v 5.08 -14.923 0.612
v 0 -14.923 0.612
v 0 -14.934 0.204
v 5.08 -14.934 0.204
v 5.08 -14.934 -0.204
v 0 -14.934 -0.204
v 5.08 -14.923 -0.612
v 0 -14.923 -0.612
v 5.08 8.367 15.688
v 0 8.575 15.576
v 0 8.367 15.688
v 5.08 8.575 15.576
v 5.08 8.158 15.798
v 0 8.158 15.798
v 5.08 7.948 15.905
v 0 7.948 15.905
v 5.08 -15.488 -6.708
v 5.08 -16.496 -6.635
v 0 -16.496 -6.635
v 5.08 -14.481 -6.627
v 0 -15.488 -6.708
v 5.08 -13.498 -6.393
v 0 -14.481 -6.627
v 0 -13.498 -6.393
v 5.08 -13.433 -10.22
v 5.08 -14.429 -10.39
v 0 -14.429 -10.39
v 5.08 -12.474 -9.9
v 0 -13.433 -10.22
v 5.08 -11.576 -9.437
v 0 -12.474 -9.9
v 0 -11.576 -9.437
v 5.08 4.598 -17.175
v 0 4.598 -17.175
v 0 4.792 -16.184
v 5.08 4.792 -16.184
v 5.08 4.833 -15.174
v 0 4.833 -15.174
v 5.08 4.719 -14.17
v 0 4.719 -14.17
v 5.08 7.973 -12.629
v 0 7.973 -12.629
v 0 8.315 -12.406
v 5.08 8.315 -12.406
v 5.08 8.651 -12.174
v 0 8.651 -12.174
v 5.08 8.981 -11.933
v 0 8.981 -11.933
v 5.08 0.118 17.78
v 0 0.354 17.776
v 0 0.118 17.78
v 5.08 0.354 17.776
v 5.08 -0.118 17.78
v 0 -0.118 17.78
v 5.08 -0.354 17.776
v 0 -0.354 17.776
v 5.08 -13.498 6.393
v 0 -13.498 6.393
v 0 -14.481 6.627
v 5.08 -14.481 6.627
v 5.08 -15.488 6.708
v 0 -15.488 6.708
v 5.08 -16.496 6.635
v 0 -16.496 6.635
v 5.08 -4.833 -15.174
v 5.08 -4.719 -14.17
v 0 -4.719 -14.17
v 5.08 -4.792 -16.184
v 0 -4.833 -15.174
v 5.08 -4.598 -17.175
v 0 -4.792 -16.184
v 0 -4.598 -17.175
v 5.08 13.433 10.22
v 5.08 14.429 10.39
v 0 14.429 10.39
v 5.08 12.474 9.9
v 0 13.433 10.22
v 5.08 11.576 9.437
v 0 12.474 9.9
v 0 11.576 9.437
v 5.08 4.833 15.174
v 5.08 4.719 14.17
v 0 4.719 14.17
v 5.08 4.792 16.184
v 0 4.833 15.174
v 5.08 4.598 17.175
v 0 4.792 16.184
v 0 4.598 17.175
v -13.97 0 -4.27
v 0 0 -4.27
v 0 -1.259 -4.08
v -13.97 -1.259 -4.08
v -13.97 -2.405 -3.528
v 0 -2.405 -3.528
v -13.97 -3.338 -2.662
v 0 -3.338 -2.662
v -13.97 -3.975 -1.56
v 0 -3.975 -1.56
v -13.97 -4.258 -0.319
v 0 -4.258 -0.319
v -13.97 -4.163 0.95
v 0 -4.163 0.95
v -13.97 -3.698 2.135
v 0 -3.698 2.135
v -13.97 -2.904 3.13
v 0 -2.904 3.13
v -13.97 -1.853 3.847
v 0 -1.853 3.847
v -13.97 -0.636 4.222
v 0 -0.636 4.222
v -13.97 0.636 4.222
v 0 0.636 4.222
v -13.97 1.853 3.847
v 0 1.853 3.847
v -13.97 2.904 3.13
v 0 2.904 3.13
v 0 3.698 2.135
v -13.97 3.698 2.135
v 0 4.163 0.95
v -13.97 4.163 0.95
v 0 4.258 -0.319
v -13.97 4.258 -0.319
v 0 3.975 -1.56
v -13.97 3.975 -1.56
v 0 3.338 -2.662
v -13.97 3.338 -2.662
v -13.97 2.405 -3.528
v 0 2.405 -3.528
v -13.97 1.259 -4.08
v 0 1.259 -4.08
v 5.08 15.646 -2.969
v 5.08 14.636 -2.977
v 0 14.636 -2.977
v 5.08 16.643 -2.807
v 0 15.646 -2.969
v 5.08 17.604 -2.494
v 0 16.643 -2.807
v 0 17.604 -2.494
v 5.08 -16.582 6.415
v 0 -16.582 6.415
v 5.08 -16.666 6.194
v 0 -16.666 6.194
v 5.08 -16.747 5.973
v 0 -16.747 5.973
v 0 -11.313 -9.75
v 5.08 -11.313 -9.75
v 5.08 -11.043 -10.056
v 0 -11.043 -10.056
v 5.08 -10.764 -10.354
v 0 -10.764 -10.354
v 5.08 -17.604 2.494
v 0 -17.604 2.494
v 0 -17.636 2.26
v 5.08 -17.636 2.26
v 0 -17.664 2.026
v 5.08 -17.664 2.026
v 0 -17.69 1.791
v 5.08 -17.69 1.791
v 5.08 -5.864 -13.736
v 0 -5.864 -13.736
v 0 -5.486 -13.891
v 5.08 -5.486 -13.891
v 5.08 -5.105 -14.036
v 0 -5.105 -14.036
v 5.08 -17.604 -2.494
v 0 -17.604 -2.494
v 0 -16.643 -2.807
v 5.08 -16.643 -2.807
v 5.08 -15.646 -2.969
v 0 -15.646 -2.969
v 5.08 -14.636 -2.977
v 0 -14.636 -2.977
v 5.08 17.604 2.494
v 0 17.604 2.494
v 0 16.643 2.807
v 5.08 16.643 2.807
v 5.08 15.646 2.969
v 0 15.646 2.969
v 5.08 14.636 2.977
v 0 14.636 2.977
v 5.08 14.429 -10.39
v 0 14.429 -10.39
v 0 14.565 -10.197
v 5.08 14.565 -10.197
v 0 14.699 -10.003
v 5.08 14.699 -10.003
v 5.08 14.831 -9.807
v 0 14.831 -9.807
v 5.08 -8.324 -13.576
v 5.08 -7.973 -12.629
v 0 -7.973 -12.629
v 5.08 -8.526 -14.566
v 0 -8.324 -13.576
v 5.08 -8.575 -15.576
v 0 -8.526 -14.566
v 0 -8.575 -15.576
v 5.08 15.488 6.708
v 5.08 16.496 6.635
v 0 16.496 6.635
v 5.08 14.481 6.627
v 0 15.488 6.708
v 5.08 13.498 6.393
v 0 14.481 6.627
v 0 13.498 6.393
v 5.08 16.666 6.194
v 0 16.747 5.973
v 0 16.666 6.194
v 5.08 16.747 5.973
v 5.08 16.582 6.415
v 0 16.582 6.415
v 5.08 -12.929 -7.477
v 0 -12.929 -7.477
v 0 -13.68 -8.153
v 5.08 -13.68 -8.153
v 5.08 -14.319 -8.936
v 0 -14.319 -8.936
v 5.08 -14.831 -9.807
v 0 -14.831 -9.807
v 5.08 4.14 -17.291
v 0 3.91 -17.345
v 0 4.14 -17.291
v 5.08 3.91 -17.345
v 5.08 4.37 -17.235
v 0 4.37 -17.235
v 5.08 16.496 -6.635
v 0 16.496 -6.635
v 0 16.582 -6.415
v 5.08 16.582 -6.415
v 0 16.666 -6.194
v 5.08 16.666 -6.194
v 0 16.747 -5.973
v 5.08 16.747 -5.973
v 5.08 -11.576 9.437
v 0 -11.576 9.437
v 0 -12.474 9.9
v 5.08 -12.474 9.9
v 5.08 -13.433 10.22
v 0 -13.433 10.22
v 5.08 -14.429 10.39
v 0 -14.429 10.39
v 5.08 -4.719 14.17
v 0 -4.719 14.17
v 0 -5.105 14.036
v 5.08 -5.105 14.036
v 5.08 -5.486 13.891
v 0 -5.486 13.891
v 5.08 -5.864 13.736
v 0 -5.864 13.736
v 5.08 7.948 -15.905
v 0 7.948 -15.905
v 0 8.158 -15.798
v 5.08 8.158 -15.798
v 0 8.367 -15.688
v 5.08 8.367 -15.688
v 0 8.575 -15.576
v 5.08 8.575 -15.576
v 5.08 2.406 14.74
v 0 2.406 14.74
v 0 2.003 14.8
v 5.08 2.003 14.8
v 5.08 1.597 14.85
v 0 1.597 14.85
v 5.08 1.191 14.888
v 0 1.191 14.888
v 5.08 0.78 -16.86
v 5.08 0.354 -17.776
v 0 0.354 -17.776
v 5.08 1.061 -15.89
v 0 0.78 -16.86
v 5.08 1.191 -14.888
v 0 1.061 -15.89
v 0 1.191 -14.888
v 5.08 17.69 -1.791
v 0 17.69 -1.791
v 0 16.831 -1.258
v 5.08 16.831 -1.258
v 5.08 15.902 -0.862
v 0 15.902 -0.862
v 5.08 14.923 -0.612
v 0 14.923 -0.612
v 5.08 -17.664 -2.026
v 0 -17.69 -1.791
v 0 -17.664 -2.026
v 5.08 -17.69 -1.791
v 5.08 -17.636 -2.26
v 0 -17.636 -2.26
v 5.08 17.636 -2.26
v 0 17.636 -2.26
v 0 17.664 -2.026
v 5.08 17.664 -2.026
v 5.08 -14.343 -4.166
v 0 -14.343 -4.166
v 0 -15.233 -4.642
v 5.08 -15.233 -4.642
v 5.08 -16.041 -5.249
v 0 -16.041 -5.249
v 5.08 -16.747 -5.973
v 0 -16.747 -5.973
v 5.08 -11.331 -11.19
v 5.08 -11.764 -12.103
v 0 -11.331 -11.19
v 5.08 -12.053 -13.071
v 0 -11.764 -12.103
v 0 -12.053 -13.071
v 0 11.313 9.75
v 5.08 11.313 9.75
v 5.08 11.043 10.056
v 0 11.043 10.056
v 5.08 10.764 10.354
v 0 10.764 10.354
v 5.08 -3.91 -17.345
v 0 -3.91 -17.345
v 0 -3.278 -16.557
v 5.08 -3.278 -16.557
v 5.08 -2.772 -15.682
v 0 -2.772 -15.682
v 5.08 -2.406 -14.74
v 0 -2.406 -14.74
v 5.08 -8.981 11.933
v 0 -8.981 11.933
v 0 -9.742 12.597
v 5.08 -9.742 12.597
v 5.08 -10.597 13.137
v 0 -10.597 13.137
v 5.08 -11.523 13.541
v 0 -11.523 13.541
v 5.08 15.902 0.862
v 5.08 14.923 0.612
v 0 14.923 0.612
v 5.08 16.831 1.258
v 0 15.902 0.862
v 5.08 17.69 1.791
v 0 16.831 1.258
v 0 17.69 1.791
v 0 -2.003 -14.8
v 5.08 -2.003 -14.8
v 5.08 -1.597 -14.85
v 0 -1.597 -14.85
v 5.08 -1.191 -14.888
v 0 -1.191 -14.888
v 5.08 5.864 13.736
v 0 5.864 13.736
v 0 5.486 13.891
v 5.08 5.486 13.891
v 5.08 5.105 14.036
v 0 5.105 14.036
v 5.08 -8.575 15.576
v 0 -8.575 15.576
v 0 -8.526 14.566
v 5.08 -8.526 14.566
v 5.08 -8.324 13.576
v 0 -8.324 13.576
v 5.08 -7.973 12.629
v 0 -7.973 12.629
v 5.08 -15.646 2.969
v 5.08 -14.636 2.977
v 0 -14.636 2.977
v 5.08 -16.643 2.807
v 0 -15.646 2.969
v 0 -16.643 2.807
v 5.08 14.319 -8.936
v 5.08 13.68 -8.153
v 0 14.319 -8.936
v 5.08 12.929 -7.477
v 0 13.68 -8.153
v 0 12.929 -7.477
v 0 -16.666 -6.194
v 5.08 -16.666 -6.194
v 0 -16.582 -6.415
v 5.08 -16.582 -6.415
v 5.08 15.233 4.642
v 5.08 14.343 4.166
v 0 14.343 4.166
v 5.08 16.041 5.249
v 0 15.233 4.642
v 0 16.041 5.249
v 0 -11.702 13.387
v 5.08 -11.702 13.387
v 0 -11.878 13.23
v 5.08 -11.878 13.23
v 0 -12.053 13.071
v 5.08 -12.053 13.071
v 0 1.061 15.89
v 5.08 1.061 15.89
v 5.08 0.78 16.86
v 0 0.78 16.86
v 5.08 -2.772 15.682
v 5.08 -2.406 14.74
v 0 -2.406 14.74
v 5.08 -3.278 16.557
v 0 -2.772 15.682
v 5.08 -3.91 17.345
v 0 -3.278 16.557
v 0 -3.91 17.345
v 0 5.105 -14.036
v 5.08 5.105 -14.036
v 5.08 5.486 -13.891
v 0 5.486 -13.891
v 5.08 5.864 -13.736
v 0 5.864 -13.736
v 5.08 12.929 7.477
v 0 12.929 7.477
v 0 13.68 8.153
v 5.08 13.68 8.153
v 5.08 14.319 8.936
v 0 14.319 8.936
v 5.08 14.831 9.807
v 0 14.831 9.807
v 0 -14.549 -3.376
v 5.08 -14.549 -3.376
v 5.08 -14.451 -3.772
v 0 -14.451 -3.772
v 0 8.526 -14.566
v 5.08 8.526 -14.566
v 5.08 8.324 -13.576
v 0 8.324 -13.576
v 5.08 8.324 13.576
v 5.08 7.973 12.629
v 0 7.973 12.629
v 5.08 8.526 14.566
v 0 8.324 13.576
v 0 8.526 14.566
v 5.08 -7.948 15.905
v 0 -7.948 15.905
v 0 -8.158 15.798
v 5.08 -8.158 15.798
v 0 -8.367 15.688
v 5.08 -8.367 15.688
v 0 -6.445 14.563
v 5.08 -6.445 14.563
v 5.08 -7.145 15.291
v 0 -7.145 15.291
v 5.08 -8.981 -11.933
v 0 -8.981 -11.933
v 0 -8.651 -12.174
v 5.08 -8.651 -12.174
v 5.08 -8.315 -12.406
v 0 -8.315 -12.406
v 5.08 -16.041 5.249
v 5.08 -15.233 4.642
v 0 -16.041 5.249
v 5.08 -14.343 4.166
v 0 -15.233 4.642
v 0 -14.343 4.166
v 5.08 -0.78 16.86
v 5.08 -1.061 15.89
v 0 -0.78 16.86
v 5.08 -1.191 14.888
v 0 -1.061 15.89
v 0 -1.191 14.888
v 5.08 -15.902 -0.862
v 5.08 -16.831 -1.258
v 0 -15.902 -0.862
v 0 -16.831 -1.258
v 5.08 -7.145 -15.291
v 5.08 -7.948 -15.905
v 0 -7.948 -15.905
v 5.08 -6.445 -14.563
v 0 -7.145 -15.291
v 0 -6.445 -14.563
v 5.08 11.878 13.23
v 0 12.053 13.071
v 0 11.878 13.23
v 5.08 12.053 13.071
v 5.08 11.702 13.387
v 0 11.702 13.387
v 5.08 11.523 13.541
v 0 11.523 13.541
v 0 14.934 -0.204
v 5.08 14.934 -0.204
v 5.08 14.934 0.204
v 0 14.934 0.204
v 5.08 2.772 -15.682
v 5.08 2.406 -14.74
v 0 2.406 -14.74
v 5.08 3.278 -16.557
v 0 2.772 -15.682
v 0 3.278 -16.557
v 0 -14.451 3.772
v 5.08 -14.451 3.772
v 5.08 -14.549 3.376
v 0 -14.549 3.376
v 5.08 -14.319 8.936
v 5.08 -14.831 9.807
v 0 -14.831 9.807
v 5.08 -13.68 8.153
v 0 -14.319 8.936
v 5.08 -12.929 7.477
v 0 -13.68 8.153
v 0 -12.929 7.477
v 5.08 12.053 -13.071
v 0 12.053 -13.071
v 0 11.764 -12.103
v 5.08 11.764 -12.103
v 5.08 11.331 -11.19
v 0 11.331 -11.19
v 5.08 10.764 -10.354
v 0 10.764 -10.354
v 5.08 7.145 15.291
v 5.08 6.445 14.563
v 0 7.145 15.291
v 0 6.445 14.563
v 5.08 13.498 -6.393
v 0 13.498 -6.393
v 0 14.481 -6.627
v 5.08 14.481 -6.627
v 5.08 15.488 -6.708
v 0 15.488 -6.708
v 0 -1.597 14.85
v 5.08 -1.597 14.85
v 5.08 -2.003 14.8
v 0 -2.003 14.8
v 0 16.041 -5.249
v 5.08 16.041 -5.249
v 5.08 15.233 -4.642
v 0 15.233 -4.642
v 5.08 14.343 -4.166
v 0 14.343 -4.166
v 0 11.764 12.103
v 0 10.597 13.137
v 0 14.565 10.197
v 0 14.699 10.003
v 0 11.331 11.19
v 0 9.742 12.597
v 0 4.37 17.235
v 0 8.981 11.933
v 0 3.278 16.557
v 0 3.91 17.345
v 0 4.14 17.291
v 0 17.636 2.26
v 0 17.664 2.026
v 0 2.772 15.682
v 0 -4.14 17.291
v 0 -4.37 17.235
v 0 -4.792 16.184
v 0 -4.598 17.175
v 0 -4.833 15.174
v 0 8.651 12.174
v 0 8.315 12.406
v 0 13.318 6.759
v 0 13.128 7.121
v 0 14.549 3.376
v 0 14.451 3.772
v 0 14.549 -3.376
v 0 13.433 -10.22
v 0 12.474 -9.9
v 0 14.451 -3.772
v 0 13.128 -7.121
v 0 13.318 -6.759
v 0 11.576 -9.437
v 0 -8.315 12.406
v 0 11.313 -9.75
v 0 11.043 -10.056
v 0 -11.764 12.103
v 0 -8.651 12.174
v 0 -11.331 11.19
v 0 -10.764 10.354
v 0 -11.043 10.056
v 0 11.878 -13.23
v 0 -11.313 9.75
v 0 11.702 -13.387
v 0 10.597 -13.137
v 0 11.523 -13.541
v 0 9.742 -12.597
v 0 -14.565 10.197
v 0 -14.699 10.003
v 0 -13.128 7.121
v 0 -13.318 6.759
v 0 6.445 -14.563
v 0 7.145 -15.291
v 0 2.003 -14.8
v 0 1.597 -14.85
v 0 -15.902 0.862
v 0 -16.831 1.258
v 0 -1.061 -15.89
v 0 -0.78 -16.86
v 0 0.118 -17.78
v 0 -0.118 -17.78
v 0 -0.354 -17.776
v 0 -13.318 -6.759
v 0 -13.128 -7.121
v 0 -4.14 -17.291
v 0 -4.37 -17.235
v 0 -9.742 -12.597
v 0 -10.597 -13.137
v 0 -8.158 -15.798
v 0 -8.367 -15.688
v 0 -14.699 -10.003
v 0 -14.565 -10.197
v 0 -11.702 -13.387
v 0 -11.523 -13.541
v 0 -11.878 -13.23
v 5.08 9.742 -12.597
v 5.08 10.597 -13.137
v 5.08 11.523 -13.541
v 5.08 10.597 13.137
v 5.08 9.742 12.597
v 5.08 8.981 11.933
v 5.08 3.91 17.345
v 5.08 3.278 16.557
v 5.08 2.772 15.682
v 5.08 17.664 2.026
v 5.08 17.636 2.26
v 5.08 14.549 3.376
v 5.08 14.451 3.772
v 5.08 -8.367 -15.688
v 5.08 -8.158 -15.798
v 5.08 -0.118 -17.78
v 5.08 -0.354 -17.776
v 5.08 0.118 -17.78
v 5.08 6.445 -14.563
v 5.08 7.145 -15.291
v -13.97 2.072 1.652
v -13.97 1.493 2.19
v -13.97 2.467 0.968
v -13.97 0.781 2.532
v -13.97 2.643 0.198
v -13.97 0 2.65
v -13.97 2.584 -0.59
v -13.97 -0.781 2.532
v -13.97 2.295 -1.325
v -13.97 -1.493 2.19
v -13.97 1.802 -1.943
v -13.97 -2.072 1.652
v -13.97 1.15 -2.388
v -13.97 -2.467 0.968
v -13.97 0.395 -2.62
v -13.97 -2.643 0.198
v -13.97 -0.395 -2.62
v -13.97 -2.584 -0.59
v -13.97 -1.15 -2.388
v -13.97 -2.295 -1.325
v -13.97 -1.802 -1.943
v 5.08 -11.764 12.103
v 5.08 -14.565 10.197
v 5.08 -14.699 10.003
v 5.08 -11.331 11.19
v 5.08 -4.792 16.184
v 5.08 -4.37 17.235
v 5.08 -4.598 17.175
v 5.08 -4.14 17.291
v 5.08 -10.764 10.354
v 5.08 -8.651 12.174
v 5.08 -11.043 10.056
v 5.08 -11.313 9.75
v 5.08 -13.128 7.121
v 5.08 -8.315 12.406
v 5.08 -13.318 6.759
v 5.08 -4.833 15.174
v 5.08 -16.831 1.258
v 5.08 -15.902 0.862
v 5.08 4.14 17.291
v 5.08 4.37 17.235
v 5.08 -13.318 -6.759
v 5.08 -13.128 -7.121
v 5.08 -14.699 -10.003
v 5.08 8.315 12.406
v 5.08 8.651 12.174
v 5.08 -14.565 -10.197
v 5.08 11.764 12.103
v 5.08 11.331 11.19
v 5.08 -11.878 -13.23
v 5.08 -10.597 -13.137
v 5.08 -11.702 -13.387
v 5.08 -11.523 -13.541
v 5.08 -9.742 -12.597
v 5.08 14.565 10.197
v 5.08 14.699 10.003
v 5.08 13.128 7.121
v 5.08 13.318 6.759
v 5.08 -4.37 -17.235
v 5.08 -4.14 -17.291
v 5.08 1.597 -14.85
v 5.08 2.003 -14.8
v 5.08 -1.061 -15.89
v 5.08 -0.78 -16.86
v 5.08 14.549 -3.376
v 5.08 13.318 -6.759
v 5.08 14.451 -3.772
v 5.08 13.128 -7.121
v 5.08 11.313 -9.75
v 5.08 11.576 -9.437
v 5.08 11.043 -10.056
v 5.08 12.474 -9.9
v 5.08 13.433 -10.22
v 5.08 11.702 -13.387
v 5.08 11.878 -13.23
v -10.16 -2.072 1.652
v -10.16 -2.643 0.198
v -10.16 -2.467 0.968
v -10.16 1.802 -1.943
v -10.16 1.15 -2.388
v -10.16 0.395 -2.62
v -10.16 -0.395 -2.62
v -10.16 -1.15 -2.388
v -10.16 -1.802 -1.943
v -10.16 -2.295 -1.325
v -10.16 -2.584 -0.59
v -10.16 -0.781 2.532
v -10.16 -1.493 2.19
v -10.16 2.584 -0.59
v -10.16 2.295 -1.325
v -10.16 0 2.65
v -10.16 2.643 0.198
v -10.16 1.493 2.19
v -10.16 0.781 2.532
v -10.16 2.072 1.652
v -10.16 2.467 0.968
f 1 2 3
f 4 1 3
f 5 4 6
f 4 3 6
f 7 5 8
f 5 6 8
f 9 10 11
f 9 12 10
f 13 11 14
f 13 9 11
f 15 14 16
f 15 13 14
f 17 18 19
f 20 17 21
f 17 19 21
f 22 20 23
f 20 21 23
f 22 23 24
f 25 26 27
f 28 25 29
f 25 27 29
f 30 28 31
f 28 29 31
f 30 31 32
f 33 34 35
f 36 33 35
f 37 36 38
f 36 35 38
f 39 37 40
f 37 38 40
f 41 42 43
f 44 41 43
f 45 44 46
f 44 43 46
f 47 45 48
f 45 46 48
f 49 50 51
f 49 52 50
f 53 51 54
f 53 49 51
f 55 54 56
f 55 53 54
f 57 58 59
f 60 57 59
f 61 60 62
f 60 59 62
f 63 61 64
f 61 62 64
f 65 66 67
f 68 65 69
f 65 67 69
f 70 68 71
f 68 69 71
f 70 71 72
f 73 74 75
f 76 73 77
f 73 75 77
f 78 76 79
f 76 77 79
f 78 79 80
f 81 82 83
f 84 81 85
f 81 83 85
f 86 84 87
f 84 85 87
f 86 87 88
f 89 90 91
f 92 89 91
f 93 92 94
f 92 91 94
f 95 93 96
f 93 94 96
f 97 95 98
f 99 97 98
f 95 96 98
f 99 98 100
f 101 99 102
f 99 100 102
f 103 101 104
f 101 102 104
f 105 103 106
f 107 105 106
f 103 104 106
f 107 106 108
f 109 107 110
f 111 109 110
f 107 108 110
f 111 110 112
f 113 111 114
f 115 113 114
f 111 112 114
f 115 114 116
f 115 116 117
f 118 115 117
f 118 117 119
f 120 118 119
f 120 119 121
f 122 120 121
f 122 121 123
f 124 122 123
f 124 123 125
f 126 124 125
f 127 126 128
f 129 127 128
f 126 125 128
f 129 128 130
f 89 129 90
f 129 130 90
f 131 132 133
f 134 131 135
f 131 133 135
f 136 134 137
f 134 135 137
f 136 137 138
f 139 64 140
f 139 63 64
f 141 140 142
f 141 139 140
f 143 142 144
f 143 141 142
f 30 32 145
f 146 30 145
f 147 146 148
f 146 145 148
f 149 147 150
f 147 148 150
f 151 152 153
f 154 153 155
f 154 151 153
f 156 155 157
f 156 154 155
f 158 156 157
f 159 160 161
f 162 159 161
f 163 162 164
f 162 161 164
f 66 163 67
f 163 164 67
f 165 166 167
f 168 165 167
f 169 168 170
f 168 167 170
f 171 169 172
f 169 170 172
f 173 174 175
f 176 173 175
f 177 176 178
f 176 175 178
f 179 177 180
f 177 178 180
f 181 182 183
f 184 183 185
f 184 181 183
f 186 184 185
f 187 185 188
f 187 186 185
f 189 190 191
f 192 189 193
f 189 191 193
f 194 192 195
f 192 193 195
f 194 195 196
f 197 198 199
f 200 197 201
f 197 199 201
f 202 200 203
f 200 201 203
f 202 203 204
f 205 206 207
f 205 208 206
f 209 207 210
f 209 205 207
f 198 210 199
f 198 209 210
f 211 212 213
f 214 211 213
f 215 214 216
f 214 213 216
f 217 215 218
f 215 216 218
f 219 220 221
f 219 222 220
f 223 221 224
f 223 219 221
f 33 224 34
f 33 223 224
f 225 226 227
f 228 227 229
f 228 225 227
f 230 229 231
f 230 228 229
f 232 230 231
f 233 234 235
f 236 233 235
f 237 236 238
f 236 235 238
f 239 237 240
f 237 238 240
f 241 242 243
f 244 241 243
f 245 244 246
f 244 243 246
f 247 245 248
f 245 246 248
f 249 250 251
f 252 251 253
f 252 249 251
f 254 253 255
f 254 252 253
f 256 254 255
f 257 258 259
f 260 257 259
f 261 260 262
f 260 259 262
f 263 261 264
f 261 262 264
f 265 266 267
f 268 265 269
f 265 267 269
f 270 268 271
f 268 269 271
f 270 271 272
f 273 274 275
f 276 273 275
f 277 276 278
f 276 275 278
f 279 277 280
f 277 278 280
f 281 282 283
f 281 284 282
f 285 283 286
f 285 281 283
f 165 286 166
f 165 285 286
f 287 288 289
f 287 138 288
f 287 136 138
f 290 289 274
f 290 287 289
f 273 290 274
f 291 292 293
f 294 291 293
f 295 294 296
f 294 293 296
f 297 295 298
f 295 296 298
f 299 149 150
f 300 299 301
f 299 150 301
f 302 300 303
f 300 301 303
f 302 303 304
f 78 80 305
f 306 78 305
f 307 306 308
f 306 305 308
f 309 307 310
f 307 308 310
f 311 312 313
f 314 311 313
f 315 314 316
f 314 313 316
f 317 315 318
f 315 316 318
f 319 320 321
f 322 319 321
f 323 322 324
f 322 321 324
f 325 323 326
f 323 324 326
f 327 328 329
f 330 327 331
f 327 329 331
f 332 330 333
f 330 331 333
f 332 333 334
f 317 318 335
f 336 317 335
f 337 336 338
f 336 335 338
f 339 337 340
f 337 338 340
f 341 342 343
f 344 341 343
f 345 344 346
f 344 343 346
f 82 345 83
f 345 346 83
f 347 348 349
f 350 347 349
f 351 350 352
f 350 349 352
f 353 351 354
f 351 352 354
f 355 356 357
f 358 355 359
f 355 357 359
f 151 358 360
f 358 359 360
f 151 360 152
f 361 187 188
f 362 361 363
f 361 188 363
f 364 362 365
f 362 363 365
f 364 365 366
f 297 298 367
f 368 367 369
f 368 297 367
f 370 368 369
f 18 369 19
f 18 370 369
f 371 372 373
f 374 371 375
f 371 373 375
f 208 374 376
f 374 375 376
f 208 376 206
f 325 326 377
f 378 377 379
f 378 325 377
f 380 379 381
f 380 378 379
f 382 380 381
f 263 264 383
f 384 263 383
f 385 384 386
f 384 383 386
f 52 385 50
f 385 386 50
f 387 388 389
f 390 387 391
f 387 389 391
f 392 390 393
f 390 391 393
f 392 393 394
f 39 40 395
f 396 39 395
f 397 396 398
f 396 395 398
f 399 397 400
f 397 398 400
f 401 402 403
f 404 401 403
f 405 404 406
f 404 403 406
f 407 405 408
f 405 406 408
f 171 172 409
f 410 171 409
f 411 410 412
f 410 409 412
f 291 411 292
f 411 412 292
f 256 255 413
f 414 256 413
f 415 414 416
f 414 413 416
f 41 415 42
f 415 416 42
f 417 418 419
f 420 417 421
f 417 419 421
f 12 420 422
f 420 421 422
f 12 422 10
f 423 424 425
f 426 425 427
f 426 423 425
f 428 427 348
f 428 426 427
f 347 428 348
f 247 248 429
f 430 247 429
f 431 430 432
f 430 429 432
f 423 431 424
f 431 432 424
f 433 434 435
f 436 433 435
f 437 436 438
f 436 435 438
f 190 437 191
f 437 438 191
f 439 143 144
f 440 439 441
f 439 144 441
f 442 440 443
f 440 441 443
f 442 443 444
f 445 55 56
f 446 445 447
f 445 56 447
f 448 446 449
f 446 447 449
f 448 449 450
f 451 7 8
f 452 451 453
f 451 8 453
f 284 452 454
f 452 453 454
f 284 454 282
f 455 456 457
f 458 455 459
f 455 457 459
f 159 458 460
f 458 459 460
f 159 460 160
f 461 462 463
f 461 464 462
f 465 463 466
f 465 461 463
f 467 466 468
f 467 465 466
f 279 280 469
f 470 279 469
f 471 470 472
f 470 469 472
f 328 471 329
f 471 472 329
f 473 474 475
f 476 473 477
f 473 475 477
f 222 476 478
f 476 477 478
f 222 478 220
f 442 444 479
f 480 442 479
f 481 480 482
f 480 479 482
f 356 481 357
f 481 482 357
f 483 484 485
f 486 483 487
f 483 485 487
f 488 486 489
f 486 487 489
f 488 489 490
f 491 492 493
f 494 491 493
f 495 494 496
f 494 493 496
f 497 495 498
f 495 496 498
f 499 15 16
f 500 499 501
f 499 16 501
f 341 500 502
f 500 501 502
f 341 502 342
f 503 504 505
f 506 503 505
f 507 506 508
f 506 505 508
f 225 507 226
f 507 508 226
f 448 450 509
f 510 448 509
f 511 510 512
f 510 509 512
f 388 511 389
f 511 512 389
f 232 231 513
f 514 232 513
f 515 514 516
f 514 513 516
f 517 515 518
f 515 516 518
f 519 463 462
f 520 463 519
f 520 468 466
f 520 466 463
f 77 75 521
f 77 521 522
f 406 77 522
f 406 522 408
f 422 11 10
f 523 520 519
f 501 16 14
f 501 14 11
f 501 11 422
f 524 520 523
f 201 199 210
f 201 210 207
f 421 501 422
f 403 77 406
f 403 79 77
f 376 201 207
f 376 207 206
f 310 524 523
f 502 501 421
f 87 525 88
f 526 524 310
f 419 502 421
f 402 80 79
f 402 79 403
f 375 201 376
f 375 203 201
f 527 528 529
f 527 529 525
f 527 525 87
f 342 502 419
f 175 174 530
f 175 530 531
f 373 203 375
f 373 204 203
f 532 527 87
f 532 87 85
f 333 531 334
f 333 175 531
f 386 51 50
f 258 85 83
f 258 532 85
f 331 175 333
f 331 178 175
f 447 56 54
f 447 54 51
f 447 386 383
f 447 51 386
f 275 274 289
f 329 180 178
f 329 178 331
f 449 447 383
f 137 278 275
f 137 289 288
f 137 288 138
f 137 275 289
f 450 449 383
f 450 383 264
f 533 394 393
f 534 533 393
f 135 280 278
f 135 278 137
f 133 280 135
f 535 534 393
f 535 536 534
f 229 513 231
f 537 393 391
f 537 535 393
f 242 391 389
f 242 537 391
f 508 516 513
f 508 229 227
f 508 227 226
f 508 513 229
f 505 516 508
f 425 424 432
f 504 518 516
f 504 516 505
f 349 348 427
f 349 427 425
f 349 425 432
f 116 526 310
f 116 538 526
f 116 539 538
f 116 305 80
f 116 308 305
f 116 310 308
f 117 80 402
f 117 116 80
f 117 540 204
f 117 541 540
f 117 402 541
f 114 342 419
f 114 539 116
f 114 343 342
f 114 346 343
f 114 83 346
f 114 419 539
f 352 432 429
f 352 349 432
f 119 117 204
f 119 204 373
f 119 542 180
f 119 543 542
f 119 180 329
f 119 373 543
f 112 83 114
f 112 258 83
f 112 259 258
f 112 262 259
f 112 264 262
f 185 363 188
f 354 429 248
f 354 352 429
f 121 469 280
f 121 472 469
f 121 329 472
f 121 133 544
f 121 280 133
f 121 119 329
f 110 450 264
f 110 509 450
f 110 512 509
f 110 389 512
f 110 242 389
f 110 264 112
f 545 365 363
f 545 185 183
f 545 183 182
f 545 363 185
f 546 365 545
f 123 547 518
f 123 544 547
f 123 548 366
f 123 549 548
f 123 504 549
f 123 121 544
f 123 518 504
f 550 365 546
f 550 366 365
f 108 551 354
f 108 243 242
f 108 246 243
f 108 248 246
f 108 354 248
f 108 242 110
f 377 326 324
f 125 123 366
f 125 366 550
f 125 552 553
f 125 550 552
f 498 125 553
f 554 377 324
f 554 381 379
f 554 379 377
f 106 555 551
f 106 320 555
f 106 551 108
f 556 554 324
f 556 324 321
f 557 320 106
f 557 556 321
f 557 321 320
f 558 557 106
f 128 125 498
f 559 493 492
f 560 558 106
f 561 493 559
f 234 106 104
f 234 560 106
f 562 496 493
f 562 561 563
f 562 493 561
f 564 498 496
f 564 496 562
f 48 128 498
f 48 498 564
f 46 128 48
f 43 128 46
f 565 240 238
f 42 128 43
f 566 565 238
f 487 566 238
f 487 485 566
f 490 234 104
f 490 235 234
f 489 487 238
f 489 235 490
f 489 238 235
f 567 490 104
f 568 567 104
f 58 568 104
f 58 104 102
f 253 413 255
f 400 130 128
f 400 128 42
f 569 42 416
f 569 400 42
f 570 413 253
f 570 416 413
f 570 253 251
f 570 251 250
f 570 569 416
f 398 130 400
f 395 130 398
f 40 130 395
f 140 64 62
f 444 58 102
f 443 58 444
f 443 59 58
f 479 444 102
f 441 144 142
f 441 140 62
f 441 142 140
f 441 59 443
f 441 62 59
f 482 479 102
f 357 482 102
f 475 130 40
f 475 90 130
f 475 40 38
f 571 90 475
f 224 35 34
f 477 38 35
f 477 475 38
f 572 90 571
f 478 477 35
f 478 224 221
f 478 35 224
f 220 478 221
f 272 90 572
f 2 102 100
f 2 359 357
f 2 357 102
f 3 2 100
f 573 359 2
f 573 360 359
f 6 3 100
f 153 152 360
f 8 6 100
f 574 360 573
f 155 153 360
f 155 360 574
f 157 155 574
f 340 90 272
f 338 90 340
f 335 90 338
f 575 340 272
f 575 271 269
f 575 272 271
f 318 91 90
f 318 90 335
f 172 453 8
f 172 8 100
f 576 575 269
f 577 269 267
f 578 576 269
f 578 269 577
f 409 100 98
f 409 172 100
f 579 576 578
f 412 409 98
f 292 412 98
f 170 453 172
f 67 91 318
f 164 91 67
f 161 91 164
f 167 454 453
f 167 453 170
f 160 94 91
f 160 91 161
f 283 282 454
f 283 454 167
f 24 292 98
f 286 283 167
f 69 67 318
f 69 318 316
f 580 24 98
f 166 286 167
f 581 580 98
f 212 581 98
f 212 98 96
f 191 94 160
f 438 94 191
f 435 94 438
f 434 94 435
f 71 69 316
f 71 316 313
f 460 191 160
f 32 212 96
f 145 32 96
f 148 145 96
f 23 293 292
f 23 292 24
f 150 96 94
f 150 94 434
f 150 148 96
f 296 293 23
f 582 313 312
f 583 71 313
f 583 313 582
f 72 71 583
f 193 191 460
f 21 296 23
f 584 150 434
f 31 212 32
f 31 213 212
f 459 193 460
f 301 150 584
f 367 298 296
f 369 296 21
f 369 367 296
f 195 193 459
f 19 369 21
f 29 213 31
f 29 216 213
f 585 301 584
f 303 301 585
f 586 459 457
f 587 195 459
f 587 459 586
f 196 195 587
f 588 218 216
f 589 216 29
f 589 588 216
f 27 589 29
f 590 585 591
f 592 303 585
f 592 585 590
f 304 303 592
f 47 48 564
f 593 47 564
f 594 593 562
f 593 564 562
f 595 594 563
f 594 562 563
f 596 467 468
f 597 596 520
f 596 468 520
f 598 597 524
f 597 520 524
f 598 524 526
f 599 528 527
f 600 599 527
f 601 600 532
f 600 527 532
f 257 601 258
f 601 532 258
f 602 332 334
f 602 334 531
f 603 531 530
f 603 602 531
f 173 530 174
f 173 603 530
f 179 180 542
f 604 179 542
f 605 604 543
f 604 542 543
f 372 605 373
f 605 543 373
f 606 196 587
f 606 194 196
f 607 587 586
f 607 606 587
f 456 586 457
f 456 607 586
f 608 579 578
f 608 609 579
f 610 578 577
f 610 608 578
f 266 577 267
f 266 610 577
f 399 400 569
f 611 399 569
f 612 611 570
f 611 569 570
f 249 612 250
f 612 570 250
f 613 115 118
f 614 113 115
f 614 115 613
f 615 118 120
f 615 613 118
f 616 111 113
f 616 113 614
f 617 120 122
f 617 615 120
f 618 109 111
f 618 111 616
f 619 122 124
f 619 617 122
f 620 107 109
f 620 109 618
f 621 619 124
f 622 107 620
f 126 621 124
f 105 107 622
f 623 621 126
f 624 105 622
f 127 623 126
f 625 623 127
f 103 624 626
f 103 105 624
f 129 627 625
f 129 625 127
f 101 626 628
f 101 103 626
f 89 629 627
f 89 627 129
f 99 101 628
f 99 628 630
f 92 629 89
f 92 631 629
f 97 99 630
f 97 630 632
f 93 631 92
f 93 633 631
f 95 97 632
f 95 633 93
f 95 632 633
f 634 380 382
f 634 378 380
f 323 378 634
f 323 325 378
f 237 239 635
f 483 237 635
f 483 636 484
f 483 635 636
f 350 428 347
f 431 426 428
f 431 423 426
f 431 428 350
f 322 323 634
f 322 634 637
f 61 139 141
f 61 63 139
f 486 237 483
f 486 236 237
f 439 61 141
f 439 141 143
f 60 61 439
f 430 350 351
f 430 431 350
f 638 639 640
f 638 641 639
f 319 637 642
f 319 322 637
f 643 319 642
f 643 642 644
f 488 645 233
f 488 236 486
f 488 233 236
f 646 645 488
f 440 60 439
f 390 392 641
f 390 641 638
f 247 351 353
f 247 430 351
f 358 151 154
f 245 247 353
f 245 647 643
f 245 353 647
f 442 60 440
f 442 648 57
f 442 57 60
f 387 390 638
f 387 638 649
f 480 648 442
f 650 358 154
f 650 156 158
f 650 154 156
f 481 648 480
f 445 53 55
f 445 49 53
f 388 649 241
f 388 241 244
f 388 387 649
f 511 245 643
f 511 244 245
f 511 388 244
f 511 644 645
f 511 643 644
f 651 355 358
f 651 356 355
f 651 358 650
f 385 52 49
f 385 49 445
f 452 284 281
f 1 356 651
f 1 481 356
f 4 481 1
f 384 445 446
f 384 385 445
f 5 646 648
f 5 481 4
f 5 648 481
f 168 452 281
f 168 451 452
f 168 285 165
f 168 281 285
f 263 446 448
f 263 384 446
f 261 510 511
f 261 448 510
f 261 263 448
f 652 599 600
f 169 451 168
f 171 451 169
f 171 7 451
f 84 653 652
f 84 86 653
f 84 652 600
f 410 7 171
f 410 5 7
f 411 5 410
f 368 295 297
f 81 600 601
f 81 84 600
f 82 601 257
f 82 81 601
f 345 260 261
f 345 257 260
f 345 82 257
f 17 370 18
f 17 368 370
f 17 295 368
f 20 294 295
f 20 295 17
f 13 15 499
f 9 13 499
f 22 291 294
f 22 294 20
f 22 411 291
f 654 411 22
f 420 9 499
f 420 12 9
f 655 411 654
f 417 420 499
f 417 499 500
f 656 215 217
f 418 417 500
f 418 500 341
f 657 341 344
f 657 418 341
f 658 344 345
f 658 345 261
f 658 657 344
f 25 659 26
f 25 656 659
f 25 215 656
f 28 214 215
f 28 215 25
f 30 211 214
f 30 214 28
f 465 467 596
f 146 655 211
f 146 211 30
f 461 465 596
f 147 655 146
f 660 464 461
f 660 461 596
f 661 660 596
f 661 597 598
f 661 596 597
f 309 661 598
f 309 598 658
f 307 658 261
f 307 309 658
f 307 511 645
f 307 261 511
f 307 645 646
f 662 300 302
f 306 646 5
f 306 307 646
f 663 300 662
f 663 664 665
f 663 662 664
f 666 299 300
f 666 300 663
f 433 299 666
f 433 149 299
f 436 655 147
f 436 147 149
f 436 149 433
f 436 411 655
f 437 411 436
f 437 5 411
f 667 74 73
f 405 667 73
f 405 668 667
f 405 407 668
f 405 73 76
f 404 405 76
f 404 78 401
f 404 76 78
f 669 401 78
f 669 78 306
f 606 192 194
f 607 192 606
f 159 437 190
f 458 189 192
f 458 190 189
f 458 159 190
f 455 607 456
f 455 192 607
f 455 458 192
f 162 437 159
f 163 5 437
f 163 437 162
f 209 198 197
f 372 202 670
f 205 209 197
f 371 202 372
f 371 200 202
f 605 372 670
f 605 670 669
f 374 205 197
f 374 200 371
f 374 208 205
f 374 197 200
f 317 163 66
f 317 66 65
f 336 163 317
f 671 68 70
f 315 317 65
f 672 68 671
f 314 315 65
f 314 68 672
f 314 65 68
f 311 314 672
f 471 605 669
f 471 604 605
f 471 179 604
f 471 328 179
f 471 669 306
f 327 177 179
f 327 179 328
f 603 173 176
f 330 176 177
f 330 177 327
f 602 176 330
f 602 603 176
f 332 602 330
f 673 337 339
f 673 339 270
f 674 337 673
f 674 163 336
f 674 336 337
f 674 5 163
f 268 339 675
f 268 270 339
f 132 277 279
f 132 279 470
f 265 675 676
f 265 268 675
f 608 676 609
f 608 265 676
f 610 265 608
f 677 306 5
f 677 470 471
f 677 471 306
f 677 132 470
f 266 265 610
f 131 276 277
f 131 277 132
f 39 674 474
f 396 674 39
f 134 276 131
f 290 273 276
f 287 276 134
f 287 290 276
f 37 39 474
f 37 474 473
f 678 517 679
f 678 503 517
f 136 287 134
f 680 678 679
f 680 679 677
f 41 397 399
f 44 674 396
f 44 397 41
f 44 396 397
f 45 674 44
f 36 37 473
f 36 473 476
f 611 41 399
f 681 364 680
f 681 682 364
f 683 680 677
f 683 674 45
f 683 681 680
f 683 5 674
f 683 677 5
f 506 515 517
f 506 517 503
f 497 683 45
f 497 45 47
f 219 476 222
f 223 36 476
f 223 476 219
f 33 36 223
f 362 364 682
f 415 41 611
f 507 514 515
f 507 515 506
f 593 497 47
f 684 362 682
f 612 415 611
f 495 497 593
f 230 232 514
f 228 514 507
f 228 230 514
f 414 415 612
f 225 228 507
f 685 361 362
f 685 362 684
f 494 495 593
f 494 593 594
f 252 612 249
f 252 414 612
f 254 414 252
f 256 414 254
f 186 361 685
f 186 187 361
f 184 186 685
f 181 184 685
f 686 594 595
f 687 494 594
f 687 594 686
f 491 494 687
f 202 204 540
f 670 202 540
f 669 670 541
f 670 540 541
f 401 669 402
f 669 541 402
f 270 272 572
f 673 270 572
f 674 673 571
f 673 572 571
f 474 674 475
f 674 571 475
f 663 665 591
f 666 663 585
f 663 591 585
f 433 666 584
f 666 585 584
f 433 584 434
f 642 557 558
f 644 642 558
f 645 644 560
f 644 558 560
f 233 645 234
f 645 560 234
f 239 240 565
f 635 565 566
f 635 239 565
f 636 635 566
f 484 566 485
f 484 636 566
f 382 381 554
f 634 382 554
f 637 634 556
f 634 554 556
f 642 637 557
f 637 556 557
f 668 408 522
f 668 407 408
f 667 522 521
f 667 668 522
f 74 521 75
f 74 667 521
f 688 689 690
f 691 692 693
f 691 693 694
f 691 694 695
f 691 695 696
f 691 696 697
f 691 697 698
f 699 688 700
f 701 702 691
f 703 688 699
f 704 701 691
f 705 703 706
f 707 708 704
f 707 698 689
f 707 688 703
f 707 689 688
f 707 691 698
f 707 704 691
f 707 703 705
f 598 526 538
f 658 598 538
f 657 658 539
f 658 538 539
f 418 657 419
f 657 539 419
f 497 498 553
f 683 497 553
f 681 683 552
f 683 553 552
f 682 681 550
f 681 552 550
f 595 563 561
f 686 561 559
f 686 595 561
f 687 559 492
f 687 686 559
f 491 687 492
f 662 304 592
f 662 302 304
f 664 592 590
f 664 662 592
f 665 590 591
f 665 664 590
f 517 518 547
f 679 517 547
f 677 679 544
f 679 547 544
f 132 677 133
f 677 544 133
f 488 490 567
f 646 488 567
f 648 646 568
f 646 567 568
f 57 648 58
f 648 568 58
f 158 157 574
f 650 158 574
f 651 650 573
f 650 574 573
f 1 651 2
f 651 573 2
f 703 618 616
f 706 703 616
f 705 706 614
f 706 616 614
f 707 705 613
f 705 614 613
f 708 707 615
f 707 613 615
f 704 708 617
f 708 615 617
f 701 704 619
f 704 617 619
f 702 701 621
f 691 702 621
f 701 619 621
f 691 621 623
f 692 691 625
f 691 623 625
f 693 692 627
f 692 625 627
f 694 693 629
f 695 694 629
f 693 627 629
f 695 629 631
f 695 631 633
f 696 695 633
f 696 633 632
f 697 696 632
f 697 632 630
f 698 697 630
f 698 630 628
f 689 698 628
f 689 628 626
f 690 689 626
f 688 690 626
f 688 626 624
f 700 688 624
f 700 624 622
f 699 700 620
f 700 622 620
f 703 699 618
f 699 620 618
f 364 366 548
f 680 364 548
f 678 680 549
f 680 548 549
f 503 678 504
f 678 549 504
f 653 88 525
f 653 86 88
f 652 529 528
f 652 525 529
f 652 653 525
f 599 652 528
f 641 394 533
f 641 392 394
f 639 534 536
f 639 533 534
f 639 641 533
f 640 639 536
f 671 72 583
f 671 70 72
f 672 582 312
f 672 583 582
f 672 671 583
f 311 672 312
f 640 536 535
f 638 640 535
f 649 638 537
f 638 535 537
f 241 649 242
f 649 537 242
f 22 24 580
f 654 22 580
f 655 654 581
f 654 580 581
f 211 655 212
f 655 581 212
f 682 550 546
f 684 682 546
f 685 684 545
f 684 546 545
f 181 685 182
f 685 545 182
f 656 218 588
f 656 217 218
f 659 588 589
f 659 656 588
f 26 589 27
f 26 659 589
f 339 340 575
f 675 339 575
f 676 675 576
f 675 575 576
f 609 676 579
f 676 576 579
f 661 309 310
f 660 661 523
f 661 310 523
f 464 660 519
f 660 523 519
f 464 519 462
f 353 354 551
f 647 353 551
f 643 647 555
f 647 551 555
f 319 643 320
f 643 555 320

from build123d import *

# Parameters (mm, degrees)
BASPROSKE_W         = 5.08
BASPROSKE_H         = 17.78
TOOTHCUT_DEPTH      = 26.652742543
TEETHCUTS_COUNT     = 26
TEETHCUTS_ANGLE     = 346.153846154
BORSKE_R            = 0.99949
BORE_DEPTH          = 50.8000508
SKETCH1_R           = 0.99949
BOSS_EXTRUDE1_DEPTH = 5.08
SKETCH2_R           = 4.269994
BOSS_EXTRUDE2_DEPTH = 13.97
SKETCH3_R           = 2.649982
CUT_EXTRUDE1_DEPTH  = 3.81


with BuildPart() as part:
    # BasProSke → Base-Revolve (revolve)
    with BuildSketch(Plane(origin=(0, 0, 0), x_dir=(1, 0, 0), z_dir=(0, 1, 0)), mode=Mode.PRIVATE) as base_revolve_sk:
        with Locations((2.54, 8.89)):
            Rectangle(BASPROSKE_W, BASPROSKE_H)
    revolve(base_revolve_sk.sketch.rotate(Axis((-10, 0, 0), (1, 0, 0)), 180), axis=Axis((-10, 0, 0), (1, 0, 0)))

    # TooCutSke → ToothCut (cut, through all)
    with BuildSketch(Plane(origin=(0, 0, 0), x_dir=(0, 0, -1), z_dir=(1, 0, 0))):
        with BuildLine():
            ThreePointArc((0.612177536, 14.922648482), (0, 14.9352), (-0.612177536, 14.922648482))
            ThreePointArc((-0.612177536, 14.922648482), (-1.047858816, 16.387671439), (-1.808659463, 17.713300655))
            ThreePointArc((-1.808659463, 17.713300655), (0, 17.8054), (1.808659463, 17.713300655))
            ThreePointArc((1.808659463, 17.713300655), (1.047858816, 16.387671439), (0.612177536, 14.922648482))
        make_face()
    toothcut = extrude(amount=TOOTHCUT_DEPTH, mode=Mode.SUBTRACT)

    # TeethCuts: ToothCut ×26 about axis
    teethcuts_axis = Axis((-10, 0, 0), (1, 0, 0))
    for i in range(1, TEETHCUTS_COUNT):
        add(toothcut.rotate(teethcuts_axis, i * TEETHCUTS_ANGLE / (TEETHCUTS_COUNT - 1)), mode=Mode.SUBTRACT)

    # BorSke → Bore (cut, symmetric)
    with BuildSketch(Plane(origin=(0, 0, 0), x_dir=(0, 0, -1), z_dir=(1, 0, 0))):
        with Locations(Location((0, 0, 0), (0, 0, 180))):
            Circle(BORSKE_R)
    extrude(amount=BORE_DEPTH, both=True, mode=Mode.SUBTRACT)

    # Sketch1 → Boss-Extrude1 (add)
    with BuildSketch(Plane(origin=(5.08, 0, 0), x_dir=(0, 0, -1), z_dir=(1, 0, 0))):
        Circle(SKETCH1_R)
    extrude(amount=-BOSS_EXTRUDE1_DEPTH)

    # Sketch2 → Boss-Extrude2 (add)
    with BuildSketch(Plane.ZY):
        with Locations(Location((0, 0, 0), (0, 0, 180))):
            Circle(SKETCH2_R)
    extrude(amount=BOSS_EXTRUDE2_DEPTH)

    # Sketch3 → Cut-Extrude1 (cut)
    with BuildSketch(Plane.ZY.offset(13.97)):
        Circle(SKETCH3_R)
    extrude(amount=-CUT_EXTRUDE1_DEPTH, mode=Mode.SUBTRACT)


solid = part.part
